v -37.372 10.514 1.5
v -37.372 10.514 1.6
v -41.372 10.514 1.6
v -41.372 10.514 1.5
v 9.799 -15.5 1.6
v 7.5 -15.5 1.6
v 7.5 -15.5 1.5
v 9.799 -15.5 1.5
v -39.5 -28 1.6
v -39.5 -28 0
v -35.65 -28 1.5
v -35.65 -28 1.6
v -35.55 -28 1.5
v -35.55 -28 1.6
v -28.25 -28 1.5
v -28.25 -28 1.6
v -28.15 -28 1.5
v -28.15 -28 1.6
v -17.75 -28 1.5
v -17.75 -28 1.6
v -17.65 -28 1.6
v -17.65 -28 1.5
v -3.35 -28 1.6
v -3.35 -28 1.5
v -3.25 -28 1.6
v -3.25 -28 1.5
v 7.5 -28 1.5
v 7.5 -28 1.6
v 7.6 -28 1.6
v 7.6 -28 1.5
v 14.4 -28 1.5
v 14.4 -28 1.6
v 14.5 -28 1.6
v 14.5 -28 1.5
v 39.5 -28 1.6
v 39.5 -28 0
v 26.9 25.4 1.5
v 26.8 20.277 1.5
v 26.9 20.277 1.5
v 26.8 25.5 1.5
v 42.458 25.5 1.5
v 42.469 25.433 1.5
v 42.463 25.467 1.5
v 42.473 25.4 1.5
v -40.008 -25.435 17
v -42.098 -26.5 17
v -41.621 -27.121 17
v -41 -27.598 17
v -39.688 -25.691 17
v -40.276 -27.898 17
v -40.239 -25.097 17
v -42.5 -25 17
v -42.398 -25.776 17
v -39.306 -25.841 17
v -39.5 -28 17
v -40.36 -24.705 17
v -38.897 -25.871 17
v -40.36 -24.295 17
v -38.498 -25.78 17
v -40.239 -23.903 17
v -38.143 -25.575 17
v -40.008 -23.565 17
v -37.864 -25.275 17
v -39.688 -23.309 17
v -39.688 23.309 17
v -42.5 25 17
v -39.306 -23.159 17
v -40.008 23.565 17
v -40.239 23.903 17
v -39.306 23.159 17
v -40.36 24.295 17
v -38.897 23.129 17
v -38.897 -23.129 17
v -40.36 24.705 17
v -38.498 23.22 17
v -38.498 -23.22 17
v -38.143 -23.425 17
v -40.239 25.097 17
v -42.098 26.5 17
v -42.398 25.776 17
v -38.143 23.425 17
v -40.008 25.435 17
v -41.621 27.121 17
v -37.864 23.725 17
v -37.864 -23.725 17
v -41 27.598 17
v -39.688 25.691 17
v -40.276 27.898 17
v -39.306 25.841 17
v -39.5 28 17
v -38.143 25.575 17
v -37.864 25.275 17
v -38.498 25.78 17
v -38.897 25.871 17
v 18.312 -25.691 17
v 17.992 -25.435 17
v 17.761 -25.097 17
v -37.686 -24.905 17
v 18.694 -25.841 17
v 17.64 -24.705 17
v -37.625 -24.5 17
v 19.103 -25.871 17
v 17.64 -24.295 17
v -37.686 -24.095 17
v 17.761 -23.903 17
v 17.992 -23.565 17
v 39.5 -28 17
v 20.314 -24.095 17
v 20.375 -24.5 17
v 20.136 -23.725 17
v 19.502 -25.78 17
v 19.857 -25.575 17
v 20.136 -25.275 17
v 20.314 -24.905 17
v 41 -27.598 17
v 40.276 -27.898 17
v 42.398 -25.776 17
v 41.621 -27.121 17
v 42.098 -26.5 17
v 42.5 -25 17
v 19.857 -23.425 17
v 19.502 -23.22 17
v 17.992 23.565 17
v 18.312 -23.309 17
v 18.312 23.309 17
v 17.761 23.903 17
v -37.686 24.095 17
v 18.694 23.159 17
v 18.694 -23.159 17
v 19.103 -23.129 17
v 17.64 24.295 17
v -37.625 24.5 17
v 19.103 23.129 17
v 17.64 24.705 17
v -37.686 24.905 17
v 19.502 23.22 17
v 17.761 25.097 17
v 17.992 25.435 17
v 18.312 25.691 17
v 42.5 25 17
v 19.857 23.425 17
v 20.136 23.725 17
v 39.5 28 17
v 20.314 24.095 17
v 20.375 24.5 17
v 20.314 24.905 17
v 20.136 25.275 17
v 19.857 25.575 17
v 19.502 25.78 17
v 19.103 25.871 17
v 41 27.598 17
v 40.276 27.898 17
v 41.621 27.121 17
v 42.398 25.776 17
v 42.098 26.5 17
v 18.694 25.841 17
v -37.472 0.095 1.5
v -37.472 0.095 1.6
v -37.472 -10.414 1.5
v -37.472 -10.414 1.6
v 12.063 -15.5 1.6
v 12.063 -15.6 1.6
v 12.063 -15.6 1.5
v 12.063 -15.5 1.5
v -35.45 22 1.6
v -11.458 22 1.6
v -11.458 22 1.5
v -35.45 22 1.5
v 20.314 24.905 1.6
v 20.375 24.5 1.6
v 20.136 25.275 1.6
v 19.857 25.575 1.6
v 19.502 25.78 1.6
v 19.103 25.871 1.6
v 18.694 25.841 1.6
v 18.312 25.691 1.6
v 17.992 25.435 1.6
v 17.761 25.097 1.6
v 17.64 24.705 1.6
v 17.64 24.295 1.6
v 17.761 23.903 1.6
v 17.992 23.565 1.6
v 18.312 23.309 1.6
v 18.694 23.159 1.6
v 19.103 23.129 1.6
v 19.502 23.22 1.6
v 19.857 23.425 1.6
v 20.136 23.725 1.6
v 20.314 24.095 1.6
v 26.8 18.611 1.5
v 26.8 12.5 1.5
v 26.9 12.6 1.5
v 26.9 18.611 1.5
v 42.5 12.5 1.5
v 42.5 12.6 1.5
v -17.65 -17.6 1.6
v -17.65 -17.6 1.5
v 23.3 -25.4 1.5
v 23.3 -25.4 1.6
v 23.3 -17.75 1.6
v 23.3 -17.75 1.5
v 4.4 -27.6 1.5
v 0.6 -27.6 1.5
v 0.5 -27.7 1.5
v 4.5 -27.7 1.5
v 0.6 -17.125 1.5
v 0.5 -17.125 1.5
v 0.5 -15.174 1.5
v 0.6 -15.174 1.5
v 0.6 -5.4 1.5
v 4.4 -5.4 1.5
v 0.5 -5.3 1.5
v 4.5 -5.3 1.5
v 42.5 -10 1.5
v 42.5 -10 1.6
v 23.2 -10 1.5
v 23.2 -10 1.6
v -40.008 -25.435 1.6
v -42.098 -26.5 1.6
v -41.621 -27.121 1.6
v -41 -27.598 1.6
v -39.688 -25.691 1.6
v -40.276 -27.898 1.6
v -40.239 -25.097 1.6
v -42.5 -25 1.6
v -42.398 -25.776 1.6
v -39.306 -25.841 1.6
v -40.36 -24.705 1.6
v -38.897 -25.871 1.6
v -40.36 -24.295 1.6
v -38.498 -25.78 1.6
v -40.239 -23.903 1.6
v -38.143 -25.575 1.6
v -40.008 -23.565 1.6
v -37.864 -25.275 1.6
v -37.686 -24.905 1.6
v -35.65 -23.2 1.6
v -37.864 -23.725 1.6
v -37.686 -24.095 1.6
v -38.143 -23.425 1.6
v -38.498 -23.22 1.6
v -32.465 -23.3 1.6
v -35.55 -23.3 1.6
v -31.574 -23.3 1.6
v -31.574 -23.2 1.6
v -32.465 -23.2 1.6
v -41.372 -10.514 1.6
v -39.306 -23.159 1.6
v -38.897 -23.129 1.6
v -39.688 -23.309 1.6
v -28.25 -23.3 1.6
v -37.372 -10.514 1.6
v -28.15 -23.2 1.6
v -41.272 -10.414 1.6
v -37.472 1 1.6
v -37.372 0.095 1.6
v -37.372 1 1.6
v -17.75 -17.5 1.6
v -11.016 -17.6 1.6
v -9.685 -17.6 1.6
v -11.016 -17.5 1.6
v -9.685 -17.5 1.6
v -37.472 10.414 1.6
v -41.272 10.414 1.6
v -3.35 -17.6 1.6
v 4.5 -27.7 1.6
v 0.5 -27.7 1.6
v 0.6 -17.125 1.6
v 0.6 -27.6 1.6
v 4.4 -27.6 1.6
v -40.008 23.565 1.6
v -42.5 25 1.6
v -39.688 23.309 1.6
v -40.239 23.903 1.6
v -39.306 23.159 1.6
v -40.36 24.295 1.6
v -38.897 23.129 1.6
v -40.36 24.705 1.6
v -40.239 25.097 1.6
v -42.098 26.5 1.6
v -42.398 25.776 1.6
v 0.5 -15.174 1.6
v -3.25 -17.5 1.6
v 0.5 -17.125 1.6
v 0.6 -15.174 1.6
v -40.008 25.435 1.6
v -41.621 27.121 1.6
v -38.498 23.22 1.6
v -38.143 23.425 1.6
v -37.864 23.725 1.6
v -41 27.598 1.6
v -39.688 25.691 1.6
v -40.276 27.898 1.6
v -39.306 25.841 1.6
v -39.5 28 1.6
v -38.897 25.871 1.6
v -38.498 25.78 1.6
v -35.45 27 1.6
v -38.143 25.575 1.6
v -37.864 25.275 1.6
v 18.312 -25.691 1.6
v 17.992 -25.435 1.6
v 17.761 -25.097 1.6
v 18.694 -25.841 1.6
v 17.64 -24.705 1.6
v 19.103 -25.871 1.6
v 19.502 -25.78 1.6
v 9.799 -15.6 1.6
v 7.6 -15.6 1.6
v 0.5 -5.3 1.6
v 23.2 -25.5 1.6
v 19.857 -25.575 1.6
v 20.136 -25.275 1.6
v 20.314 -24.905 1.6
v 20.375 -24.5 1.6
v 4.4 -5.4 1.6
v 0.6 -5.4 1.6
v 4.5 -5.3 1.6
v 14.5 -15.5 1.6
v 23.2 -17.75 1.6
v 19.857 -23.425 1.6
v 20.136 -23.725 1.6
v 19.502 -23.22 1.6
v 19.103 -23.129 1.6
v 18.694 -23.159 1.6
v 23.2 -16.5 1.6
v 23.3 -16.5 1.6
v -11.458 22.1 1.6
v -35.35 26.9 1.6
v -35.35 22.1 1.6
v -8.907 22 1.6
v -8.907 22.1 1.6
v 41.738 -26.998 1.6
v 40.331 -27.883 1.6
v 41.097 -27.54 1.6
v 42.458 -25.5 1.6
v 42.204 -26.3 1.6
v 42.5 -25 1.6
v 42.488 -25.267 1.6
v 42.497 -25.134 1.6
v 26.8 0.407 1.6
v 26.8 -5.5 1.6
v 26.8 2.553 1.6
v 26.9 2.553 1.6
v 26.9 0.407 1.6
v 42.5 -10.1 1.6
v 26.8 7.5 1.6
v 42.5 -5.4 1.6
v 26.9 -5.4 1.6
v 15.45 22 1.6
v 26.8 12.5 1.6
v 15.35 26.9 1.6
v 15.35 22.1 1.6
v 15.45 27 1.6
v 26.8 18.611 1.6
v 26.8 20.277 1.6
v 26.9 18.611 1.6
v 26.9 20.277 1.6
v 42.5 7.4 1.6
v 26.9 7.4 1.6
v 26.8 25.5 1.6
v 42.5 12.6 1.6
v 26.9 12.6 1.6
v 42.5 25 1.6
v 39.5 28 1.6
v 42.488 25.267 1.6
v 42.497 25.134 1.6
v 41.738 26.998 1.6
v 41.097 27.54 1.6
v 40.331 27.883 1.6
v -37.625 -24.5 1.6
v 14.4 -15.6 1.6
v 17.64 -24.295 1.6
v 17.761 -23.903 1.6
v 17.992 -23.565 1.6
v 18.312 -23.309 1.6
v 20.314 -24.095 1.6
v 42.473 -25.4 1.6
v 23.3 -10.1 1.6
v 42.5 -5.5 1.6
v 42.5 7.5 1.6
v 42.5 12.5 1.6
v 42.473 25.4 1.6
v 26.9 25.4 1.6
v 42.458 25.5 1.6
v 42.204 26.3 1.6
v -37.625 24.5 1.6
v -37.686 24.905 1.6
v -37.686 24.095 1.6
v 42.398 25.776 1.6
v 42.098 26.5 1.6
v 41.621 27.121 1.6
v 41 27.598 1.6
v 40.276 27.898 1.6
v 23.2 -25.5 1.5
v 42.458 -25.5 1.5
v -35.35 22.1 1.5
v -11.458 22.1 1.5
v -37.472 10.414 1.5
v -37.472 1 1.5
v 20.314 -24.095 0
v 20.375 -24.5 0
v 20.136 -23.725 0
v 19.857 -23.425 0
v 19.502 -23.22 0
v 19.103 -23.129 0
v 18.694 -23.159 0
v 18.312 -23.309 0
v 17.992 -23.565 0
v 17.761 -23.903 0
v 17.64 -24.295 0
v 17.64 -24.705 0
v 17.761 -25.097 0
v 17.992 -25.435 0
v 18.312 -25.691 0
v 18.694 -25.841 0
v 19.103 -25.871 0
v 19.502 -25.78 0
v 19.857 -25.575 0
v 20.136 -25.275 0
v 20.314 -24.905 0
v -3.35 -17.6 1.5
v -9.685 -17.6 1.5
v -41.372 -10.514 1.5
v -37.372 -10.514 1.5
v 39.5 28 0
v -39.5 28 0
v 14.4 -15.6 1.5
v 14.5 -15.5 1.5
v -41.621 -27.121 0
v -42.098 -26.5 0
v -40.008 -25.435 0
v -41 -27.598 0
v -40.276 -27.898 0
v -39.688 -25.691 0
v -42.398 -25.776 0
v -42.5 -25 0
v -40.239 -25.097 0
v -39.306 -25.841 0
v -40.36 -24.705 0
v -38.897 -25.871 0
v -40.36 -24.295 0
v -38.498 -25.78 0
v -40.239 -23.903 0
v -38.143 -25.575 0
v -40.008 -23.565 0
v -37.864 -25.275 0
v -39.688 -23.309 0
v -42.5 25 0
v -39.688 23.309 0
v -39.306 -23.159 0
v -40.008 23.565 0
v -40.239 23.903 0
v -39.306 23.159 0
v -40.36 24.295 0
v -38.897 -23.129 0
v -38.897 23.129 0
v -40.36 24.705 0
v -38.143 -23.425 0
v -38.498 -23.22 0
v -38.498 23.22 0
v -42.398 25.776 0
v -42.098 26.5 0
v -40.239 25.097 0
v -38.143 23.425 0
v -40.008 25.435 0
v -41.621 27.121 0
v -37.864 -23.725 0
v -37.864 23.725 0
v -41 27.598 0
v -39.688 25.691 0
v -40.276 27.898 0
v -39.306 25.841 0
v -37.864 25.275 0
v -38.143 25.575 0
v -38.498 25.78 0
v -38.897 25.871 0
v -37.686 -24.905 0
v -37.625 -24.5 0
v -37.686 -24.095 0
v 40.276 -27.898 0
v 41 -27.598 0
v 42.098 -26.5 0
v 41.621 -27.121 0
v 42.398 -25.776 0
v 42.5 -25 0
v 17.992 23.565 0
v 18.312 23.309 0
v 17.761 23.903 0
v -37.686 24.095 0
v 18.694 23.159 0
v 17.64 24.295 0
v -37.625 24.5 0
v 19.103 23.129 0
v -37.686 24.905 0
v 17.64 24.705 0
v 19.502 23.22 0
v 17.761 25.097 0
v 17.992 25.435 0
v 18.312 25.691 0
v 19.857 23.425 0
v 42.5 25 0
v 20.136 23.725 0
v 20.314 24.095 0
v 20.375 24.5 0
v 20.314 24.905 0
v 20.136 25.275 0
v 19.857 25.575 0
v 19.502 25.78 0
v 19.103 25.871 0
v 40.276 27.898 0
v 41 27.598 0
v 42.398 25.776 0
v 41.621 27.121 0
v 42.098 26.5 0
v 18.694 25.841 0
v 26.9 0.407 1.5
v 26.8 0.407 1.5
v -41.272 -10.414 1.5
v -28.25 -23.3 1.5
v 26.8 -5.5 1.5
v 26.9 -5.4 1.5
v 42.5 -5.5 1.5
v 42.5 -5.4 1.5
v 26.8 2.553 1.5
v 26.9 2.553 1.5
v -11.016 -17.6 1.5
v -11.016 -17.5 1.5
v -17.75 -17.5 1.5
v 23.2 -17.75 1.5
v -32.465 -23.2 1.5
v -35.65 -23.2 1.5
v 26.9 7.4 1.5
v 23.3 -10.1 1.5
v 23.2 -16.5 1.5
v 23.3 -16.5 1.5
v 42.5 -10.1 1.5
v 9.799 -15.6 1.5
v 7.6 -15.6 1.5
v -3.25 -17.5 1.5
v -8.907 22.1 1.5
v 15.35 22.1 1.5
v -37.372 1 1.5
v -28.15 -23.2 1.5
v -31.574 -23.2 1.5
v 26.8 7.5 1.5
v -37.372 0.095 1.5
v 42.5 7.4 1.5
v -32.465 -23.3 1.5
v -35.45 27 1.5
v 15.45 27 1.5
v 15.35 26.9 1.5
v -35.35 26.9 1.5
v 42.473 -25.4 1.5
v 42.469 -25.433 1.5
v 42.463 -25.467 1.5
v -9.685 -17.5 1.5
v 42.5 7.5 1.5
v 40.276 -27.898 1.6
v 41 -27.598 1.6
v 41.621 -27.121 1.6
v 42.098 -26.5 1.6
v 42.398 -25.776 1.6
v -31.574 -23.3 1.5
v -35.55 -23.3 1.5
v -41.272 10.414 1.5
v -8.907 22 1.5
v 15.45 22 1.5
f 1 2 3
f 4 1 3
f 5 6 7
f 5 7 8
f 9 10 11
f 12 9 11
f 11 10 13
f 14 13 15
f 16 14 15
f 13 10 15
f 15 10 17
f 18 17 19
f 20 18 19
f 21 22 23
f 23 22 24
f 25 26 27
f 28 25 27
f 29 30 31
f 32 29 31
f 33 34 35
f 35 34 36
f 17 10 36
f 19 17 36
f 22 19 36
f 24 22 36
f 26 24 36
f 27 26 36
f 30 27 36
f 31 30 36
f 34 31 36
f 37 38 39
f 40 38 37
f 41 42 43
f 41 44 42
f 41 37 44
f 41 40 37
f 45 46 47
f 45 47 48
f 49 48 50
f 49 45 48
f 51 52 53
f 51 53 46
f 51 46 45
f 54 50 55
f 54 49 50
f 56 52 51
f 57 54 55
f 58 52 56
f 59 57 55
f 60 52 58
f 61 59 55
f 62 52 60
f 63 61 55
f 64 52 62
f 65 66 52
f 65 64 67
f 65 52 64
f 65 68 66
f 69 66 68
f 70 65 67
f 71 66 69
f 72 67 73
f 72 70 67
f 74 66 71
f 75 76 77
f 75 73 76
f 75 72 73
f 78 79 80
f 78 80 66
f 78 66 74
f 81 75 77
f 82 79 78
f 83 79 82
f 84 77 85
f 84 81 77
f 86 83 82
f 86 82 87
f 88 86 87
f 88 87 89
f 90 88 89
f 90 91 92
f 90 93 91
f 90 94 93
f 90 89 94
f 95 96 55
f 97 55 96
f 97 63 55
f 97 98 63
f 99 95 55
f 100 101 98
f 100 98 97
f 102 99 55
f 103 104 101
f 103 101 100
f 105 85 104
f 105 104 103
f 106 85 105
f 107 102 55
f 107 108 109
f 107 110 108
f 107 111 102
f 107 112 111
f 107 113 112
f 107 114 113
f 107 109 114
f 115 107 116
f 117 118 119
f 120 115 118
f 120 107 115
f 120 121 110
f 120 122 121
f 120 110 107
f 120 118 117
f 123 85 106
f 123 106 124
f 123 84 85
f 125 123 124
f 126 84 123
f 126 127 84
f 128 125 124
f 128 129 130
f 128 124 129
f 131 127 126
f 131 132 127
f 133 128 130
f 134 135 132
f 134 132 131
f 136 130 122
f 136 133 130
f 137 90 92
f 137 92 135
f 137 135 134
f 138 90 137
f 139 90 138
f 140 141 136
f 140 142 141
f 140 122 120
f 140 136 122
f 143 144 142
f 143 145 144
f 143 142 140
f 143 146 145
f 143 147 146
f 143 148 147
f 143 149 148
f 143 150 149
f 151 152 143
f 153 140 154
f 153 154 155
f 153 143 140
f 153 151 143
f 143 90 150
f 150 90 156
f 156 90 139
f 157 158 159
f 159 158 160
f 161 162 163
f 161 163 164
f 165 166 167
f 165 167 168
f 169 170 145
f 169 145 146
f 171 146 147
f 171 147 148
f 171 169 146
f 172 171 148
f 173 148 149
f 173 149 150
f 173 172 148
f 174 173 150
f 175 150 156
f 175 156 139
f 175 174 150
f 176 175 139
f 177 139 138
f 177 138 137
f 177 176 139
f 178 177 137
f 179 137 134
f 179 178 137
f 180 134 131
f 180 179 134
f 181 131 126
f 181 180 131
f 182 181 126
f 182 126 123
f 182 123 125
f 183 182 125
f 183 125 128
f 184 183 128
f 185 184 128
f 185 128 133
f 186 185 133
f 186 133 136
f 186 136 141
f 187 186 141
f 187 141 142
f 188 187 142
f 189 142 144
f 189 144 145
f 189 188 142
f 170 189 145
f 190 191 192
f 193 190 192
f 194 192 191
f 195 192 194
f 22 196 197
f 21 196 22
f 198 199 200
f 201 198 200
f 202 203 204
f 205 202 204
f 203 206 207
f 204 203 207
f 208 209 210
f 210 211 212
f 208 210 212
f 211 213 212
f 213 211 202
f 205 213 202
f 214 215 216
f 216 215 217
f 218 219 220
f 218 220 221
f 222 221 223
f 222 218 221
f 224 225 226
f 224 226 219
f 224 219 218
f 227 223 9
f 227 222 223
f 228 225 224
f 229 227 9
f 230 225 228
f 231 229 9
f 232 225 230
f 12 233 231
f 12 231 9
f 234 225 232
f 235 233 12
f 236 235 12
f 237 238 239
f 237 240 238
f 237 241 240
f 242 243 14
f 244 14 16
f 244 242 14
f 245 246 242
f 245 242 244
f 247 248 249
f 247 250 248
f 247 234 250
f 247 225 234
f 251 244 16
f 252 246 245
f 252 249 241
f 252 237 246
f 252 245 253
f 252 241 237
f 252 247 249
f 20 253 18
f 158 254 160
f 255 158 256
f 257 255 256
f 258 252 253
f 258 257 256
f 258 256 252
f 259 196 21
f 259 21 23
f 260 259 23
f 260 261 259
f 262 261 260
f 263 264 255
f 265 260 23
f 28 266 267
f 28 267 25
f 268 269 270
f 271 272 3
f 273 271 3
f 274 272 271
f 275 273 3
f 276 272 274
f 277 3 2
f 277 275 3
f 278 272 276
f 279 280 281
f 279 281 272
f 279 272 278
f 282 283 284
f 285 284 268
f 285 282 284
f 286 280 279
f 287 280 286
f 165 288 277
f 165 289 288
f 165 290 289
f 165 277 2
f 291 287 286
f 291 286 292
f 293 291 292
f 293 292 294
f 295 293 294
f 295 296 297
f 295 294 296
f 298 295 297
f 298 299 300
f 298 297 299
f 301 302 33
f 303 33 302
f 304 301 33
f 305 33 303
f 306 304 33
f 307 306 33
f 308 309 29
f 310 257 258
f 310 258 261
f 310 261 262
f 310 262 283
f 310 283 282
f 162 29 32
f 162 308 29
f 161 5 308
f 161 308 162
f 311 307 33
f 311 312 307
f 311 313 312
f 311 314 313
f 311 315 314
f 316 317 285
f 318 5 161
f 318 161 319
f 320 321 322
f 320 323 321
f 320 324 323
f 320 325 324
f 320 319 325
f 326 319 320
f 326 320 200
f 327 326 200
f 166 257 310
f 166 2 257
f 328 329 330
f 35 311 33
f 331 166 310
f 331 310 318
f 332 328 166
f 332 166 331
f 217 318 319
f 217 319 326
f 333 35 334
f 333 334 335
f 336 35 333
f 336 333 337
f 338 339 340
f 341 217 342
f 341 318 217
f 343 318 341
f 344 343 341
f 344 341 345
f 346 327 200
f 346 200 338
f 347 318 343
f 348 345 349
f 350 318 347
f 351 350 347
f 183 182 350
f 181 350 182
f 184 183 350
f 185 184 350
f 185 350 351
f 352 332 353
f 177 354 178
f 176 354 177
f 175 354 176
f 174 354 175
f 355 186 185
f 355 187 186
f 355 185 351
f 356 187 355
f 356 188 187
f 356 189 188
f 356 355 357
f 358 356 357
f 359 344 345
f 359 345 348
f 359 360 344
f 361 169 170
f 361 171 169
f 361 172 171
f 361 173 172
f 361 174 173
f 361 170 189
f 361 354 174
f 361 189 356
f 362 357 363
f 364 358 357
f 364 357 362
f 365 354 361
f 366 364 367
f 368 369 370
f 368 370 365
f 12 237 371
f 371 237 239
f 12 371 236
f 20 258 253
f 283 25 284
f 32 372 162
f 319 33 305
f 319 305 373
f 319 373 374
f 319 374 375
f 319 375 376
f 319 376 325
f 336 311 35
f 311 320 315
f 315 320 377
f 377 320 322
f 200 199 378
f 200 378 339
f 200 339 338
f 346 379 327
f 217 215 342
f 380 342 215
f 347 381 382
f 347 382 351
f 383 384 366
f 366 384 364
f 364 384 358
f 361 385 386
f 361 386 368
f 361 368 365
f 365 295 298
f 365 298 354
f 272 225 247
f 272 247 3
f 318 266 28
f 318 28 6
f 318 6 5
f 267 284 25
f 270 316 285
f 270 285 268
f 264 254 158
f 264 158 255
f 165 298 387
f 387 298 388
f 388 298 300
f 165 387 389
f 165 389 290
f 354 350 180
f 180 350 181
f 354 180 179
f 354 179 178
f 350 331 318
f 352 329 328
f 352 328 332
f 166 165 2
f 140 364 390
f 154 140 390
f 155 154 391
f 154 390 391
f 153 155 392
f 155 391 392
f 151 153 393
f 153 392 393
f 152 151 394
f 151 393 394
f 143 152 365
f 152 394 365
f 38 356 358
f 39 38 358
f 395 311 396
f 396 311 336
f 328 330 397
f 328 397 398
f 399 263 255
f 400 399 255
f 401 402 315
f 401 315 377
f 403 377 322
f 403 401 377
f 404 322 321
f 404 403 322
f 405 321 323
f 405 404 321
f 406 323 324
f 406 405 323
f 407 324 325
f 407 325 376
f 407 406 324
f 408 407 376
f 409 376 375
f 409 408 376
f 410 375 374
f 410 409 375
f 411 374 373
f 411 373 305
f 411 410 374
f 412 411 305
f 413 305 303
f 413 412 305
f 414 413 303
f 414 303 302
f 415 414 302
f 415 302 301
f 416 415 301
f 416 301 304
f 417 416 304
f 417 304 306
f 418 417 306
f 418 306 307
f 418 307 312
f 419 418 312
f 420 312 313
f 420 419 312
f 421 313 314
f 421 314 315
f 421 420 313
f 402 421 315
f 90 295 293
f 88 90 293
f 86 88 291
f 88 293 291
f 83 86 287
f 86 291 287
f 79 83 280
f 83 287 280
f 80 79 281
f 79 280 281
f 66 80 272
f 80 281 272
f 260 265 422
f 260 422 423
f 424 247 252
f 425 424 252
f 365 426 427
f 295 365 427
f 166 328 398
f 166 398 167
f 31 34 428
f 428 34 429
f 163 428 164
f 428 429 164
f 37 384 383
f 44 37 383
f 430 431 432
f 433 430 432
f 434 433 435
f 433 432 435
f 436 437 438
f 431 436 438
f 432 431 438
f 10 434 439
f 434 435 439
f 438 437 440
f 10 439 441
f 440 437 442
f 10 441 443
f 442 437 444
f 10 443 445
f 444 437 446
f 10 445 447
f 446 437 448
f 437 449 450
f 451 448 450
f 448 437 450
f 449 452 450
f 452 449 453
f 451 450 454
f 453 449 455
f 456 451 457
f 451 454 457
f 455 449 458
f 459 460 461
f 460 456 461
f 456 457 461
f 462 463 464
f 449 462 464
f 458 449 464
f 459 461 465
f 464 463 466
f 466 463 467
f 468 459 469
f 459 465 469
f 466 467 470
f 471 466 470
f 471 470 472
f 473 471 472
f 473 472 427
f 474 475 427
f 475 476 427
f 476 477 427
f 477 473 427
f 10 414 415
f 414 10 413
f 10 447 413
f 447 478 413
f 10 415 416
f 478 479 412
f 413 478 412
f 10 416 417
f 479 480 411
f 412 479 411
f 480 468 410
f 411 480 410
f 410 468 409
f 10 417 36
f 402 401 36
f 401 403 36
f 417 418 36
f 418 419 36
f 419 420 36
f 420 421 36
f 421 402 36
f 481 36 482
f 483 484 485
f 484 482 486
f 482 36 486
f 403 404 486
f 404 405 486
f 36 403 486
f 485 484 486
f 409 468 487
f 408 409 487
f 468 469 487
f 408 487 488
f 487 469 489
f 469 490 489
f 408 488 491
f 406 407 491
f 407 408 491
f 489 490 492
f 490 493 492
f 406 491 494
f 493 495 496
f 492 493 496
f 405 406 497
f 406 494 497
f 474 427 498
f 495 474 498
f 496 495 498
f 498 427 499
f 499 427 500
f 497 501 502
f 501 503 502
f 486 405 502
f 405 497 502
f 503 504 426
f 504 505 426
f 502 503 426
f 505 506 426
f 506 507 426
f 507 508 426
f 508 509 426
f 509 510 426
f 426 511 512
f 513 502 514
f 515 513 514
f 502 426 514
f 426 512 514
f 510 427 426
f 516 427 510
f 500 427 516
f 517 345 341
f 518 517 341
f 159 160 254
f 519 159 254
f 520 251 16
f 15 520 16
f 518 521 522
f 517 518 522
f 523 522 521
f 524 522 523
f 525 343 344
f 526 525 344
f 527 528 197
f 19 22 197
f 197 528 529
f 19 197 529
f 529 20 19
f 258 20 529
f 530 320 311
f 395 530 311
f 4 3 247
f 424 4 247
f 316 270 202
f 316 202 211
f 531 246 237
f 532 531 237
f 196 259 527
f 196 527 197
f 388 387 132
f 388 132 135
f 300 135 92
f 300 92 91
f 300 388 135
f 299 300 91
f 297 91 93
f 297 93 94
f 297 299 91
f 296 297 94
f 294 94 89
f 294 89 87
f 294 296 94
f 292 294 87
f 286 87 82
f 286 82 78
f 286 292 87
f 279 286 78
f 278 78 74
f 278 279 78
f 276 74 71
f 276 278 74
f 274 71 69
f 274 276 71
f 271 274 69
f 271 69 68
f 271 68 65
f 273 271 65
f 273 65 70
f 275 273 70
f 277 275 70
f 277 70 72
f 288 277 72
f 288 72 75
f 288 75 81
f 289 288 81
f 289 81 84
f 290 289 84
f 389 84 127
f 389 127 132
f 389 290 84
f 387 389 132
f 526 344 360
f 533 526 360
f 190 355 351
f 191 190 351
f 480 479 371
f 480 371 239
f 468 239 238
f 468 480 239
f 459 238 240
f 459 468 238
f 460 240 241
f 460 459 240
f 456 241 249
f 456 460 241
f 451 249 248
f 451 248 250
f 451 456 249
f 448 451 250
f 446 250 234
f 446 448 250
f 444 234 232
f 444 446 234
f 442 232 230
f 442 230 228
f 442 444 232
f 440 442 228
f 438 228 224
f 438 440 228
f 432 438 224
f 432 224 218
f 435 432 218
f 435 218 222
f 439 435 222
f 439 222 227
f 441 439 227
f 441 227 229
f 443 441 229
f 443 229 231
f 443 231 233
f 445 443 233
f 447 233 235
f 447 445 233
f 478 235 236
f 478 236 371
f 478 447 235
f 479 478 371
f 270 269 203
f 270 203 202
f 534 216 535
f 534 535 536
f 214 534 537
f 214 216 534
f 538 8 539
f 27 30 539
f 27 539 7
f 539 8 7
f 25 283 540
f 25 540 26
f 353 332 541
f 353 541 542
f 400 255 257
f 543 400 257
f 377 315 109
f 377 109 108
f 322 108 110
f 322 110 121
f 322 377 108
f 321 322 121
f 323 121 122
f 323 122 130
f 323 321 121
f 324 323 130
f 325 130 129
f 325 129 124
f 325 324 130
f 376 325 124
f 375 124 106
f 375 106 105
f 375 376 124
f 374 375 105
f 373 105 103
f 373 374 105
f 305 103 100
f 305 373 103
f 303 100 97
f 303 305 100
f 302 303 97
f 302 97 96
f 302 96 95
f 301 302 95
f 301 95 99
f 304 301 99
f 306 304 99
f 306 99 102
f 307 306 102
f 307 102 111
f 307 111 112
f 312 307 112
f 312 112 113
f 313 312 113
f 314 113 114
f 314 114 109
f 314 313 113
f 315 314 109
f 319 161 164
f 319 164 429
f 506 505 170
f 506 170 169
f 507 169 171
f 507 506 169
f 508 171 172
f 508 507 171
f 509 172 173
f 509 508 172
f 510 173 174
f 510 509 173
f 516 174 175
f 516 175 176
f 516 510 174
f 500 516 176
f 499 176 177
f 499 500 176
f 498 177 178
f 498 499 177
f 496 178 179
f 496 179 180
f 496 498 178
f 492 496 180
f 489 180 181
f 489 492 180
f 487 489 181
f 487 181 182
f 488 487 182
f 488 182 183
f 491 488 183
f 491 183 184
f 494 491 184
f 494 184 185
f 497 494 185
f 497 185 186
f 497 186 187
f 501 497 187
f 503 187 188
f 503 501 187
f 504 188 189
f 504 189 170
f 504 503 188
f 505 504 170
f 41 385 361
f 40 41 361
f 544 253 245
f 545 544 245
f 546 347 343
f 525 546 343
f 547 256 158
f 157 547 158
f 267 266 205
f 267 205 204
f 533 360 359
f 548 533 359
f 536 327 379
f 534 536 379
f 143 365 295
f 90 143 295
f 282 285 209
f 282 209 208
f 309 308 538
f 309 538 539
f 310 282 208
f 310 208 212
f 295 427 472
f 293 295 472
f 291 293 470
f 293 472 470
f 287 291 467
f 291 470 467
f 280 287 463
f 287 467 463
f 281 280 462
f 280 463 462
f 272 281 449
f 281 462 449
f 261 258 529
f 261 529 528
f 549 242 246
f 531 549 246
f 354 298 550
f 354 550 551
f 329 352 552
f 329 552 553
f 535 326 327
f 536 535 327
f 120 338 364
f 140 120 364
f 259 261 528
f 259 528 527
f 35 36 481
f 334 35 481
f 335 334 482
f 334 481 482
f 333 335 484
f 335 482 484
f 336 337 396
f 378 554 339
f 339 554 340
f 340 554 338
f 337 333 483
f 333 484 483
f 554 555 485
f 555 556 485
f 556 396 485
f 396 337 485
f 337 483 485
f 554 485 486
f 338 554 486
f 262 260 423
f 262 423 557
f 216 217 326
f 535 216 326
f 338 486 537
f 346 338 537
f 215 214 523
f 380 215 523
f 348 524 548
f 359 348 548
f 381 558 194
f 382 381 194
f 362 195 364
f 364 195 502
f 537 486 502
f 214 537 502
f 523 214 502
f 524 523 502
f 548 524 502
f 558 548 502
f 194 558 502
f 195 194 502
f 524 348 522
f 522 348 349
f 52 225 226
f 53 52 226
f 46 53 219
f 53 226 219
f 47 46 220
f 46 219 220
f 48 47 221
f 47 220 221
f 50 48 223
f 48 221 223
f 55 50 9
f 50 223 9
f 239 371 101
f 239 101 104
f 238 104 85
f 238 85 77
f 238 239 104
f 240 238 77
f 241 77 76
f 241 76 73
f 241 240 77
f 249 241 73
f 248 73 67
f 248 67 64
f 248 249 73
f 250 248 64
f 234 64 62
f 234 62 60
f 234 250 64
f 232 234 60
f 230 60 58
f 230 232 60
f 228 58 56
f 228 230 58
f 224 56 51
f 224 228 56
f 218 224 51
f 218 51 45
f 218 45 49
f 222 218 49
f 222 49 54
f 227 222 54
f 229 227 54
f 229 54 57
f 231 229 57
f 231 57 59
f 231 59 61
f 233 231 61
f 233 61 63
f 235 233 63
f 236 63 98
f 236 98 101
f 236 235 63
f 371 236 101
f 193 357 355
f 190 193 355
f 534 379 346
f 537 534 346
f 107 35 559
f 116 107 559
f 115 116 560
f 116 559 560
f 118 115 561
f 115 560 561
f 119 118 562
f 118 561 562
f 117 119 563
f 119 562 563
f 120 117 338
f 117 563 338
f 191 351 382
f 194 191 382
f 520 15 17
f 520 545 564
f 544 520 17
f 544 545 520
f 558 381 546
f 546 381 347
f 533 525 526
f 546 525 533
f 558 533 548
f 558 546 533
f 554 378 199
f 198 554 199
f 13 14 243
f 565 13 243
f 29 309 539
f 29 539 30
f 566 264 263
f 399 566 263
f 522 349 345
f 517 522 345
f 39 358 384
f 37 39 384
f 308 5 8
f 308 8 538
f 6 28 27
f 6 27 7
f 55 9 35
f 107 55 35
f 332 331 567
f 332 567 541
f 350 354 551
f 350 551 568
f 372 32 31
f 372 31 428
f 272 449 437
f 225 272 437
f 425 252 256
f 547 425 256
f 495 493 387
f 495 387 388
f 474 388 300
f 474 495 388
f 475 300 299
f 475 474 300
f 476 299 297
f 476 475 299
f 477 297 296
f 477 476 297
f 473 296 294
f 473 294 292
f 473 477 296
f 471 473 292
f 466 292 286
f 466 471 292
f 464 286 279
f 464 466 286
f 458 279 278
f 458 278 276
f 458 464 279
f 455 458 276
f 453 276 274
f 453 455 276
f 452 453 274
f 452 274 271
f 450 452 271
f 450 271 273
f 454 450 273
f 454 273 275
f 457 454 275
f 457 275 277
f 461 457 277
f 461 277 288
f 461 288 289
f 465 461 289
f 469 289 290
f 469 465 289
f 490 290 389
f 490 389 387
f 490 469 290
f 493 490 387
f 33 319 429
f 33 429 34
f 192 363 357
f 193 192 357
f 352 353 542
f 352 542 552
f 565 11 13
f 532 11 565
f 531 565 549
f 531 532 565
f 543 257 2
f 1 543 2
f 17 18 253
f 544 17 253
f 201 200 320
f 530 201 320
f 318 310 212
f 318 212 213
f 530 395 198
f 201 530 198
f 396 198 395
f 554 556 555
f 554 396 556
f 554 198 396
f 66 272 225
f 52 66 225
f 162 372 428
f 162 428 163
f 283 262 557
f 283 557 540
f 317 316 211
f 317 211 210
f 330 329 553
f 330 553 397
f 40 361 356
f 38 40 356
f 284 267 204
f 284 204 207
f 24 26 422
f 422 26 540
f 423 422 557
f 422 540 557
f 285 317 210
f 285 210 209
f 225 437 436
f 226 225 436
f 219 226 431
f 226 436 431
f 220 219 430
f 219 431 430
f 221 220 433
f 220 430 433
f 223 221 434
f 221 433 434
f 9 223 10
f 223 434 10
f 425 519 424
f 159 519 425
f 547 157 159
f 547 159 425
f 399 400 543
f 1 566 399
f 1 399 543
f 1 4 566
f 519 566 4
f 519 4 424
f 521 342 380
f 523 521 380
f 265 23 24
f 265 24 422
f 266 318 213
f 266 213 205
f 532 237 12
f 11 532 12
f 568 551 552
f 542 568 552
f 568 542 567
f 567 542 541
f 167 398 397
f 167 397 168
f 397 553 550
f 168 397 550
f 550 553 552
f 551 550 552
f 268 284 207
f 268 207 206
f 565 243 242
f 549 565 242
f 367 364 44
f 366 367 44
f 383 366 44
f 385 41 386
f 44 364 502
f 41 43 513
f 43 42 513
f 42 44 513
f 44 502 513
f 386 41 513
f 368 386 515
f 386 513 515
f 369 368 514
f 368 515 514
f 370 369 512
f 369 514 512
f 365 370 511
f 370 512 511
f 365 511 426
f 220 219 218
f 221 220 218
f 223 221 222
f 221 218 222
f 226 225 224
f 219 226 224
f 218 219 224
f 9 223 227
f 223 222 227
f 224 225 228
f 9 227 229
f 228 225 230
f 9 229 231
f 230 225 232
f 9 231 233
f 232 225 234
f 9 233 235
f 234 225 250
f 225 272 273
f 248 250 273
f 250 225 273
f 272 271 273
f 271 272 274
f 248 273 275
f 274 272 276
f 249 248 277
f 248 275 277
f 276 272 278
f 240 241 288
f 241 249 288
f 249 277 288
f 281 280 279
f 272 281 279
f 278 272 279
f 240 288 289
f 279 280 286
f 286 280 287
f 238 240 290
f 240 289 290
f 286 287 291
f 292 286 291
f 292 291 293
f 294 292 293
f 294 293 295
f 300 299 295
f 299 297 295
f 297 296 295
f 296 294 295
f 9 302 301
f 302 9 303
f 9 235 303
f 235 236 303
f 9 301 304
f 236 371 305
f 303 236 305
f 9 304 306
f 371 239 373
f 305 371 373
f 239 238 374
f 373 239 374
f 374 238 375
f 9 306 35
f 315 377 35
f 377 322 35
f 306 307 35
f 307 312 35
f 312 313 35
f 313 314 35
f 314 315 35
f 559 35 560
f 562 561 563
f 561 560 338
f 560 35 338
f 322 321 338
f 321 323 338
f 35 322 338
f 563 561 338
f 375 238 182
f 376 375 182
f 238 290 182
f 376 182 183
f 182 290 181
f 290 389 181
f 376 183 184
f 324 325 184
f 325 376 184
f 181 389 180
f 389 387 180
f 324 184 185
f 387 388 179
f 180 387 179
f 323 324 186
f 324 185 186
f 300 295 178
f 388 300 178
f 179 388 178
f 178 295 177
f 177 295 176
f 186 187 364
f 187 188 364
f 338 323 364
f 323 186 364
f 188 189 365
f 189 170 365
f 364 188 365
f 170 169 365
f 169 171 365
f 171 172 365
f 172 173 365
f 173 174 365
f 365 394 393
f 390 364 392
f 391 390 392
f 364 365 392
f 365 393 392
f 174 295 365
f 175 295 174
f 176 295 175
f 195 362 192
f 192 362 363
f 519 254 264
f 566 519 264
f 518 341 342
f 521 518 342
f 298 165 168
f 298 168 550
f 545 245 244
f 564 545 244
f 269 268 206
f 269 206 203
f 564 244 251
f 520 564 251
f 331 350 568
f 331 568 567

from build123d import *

# Parameters (mm, degrees)
SKETCH1_R           = 1.375
BOSS_EXTRUDE1_DEPTH = 1.6
CUT_EXTRUDE1_DEPTH  = 0.1
SKETCH_1_R          = 1.375
EXTRUDE_1_DEPTH     = 15.4


with BuildPart() as part:
    # Sketch1 → Boss-Extrude1 (new body)
    with BuildSketch(Plane.XY):
        with BuildLine():
            Line((-39.5, -28), (39.5, -28))
            ThreePointArc((39.5, -28), (41.621320344, -27.121320344), (42.5, -25))
            Line((42.5, -25), (42.5, 25))
            ThreePointArc((42.5, 25), (41.621320344, 27.121320344), (39.5, 28))
            Line((39.5, 28), (-39.5, 28))
            ThreePointArc((-39.5, 28), (-41.621320344, 27.121320344), (-42.5, 25))
            Line((-42.5, 25), (-42.5, -25))
            ThreePointArc((-42.5, -25), (-41.621320344, -27.121320344), (-39.5, -28))
        make_face()
        with Locations((-39, 24.5)):
            Circle(SKETCH1_R, mode=Mode.SUBTRACT)
        with Locations((-39, -24.5)):
            Circle(SKETCH1_R, mode=Mode.SUBTRACT)
        with Locations((19, 24.5)):
            Circle(SKETCH1_R, mode=Mode.SUBTRACT)
        with Locations((19, -24.5)):
            Circle(SKETCH1_R, mode=Mode.SUBTRACT)
    extrude(amount=BOSS_EXTRUDE1_DEPTH)

    # Sketch2 → Cut-Extrude1 (cut)
    with BuildSketch(Plane.XY.offset(1.6)):
        Polygon((-35.65, -28.636850855), (-28.15, -28.636850855), (-28.15, -23.2), (-31.573707352, -23.2), (-31.573707352, -23.3), (-28.25, -23.3), (-28.25, -28.536850855), (-35.55, -28.536850855), (-35.55, -23.3), (-32.465045999, -23.3), (-32.465045999, -23.2), (-35.65, -23.2), align=None)
        Polygon((-17.75, -17.5), (-11.015830732, -17.5), (-11.015830732, -17.6), (-17.65, -17.6), (-17.65, -33.061376344), (-3.35, -33.061376344), (-3.35, -17.6), (-9.684859924, -17.6), (-9.684859924, -17.5), (-3.25, -17.5), (-3.25, -33.161376344), (-17.75, -33.161376344), align=None)
        Polygon((0.5, -5.3), (4.5, -5.3), (4.5, -27.7), (0.5, -27.7), (0.5, -17.125), (0.6, -17.125), (0.6, -27.6), (4.4, -27.6), (4.4, -5.4), (0.6, -5.4), (0.6, -15.17398131), (0.5, -15.17398131), align=None)
        Polygon((7.5, -15.5), (9.799158316, -15.5), (9.799158316, -15.6), (7.6, -15.6), (7.6, -31.061376344), (14.4, -31.061376344), (14.4, -15.6), (12.062610562, -15.6), (12.062610562, -15.5), (14.5, -15.5), (14.5, -31.161376344), (7.5, -31.161376344), align=None)
        Polygon((-35.45, 27), (15.45, 27), (15.45, 22), (-8.906687942, 22), (-8.906687942, 22.1), (15.35, 22.1), (15.35, 26.9), (-35.35, 26.9), (-35.35, 22.1), (-11.458179647, 22.1), (-11.458179647, 22), (-35.45, 22), align=None)
        Polygon((-41.371710411, -10.514157593), (-37.371710411, -10.514157593), (-37.371710411, 0.094714316), (-37.471710411, 0.094714316), (-37.471710411, -10.414157593), (-41.271710411, -10.414157593), (-41.271710411, 10.414157593), (-37.471710411, 10.414157593), (-37.471710411, 1), (-37.371710411, 1), (-37.371710411, 10.514157593), (-41.371710411, 10.514157593), align=None)
        Polygon((23.2, -25.5), (44.7, -25.5), (44.7, -10), (23.2, -10), (23.2, -16.5), (23.3, -16.5), (23.3, -10.1), (44.6, -10.1), (44.6, -25.4), (23.3, -25.4), (23.3, -17.75), (23.2, -17.75), align=None)
        Polygon((26.8, -5.5), (54.071370237, -5.5), (54.071370237, 7.5), (26.8, 7.5), (26.8, 2.552788505), (26.9, 2.552788505), (26.9, 7.4), (53.971370237, 7.4), (53.971370237, -5.4), (26.9, -5.4), (26.9, 0.407211154), (26.8, 0.407211154), align=None)
        Polygon((26.8, 12.5), (57.71374017, 12.5), (57.71374017, 25.5), (26.8, 25.5), (26.8, 20.277341759), (26.9, 20.277341759), (26.9, 25.4), (57.61374017, 25.4), (57.61374017, 12.6), (26.9, 12.6), (26.9, 18.611308355), (26.8, 18.611308355), align=None)
    extrude(amount=-CUT_EXTRUDE1_DEPTH, mode=Mode.SUBTRACT)


with BuildPart() as body_2:
    # Эскиз1 → Бобышка-Вытянуть1 (new body)
    with BuildSketch(Plane.XY.offset(1.6)):
        with BuildLine():
            Line((-39.5, -28), (39.5, -28))
            ThreePointArc((39.5, -28), (41.621320344, -27.121320344), (42.5, -25))
            Line((42.5, -25), (42.5, 25))
            ThreePointArc((42.5, 25), (41.621320344, 27.121320344), (39.5, 28))
            Line((39.5, 28), (-39.5, 28))
            ThreePointArc((-39.5, 28), (-41.621320344, 27.121320344), (-42.5, 25))
            Line((-42.5, 25), (-42.5, -25))
            ThreePointArc((-42.5, -25), (-41.621320344, -27.121320344), (-39.5, -28))
        make_face()
        with Locations((19, -24.5)):
            Circle(SKETCH_1_R, mode=Mode.SUBTRACT)
        with Locations((-39, -24.5)):
            Circle(SKETCH_1_R, mode=Mode.SUBTRACT)
        with Locations((-39, 24.5)):
            Circle(SKETCH_1_R, mode=Mode.SUBTRACT)
        with Locations((19, 24.5)):
            Circle(SKETCH_1_R, mode=Mode.SUBTRACT)
    extrude(amount=EXTRUDE_1_DEPTH)


solid = Compound([part.part, body_2.part])
